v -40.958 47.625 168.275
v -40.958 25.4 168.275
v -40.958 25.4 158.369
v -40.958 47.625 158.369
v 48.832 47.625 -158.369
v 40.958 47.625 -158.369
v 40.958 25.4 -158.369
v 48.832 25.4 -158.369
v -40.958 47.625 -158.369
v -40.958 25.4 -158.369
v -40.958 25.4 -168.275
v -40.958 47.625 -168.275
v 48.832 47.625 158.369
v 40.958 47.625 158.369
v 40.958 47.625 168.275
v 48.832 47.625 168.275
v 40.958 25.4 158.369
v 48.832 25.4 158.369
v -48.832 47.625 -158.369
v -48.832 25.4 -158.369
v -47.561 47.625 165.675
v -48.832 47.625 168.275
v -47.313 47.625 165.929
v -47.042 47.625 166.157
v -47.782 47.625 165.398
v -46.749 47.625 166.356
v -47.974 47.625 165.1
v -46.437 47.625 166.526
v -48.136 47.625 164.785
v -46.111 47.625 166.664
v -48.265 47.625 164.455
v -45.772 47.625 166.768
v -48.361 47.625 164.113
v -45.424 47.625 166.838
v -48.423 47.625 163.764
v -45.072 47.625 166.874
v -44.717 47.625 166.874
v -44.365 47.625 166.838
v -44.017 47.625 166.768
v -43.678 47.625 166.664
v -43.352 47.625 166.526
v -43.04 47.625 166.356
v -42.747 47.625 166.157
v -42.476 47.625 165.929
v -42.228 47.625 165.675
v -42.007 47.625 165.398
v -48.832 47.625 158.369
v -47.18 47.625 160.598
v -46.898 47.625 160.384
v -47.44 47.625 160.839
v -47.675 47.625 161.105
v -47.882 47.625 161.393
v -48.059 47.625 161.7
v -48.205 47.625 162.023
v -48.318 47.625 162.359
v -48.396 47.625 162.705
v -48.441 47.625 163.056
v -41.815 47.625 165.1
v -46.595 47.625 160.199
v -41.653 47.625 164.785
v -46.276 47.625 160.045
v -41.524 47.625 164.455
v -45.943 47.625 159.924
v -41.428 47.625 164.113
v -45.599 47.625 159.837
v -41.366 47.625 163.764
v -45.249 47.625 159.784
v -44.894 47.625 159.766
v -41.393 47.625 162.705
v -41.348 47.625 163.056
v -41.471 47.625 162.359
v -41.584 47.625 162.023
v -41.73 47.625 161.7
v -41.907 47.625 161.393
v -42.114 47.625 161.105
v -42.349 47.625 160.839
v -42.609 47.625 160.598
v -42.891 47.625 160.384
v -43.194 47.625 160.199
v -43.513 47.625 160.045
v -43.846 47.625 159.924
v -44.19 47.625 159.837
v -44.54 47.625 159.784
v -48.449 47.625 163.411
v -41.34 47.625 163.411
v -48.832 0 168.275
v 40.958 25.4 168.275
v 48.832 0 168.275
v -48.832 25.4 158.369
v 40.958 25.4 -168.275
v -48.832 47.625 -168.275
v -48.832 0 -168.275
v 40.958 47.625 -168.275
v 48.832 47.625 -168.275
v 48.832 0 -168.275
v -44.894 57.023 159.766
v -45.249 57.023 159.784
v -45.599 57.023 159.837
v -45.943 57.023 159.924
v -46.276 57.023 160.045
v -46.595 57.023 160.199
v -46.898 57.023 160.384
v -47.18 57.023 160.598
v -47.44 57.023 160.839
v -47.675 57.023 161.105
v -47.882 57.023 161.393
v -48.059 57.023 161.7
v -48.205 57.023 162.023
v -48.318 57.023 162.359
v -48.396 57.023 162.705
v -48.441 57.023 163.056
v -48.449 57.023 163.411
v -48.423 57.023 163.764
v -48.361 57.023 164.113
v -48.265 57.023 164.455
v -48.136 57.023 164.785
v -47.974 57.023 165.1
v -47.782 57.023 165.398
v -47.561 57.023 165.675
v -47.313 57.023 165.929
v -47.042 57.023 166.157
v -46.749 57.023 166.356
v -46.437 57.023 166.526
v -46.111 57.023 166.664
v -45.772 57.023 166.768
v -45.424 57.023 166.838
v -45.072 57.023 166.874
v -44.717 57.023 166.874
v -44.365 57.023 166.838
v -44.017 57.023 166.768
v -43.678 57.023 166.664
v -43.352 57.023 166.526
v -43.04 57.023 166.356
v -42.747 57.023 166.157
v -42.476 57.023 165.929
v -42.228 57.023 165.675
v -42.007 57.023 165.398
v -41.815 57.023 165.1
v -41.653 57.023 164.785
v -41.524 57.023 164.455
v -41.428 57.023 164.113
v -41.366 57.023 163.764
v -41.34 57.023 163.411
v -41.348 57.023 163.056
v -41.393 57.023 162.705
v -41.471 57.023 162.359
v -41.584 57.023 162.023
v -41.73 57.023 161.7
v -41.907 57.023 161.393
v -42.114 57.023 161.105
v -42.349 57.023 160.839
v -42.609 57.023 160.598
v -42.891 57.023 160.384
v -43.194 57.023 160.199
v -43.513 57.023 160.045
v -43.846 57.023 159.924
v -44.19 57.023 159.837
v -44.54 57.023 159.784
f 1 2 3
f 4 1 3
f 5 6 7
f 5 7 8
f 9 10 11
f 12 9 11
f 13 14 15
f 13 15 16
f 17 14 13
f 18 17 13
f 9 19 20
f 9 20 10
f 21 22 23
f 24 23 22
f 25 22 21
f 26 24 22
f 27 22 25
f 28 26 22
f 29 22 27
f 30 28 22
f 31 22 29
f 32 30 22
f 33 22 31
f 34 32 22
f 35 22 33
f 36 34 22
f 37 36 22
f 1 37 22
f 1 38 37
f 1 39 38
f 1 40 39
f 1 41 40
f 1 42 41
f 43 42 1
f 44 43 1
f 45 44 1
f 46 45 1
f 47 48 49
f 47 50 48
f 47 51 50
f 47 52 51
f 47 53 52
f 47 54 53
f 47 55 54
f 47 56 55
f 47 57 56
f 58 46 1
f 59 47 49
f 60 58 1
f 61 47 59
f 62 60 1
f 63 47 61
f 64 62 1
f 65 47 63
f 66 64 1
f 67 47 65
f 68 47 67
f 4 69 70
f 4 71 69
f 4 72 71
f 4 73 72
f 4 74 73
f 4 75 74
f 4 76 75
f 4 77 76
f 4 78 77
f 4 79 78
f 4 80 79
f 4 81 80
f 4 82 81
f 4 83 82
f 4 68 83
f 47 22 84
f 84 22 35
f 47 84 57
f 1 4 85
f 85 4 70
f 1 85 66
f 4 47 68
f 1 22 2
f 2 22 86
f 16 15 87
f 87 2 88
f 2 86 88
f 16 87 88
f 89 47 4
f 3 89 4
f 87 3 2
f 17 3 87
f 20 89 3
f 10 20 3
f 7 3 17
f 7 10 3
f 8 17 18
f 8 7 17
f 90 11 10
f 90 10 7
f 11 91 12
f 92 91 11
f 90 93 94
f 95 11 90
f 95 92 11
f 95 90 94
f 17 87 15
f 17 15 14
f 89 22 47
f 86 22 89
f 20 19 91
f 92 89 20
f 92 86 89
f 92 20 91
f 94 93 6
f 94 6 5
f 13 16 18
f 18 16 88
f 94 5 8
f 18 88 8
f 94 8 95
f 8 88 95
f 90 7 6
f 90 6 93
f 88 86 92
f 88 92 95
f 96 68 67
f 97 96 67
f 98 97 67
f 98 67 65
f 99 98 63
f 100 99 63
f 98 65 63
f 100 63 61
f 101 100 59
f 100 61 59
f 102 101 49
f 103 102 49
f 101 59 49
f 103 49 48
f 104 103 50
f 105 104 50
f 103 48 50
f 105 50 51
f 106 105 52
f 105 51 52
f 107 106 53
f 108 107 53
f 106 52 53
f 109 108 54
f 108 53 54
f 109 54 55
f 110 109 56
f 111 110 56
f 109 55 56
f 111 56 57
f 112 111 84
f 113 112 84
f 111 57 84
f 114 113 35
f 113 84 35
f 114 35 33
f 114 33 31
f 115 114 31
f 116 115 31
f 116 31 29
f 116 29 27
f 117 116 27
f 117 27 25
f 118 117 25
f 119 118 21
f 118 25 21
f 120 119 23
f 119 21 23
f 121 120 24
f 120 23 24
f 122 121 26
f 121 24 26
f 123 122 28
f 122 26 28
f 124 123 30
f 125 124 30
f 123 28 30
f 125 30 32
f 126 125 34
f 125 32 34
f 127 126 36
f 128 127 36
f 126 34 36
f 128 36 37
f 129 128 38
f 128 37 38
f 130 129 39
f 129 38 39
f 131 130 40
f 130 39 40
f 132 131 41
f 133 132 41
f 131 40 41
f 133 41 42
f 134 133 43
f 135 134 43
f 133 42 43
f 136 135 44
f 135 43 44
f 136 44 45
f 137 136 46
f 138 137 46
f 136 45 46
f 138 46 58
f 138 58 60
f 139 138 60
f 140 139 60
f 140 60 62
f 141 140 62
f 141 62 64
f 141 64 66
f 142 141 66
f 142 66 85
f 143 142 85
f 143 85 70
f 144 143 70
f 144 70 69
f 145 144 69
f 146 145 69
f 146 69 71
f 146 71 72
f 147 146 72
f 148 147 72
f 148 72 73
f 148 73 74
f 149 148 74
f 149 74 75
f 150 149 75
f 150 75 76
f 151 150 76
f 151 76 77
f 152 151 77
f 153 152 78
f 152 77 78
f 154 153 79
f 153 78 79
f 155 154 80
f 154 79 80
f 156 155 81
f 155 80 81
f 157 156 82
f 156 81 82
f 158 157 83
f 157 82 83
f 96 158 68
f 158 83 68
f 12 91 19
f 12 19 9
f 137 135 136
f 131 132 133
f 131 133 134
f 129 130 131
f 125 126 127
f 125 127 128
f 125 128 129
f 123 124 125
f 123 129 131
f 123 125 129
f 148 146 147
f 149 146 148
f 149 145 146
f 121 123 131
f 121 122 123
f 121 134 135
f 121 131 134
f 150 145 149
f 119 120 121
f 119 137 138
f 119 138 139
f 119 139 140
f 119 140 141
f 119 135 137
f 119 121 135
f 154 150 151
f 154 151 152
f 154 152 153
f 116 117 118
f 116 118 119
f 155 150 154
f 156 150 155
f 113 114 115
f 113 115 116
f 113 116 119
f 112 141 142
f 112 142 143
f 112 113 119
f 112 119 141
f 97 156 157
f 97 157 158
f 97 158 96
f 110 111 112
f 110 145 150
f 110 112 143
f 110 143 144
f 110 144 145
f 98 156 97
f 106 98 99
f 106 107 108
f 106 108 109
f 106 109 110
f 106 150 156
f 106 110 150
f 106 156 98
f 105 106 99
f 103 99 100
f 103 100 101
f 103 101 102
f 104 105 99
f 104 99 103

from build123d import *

# Parameters (mm, degrees)
SKETCH1_W           = 97.663
SKETCH1_H           = 336.55
BASE_DEPTH          = 25.4
SKETCH2_W           = 7.874
SKETCH2_H           = 9.906
BOSS_EXTRUDE2_DEPTH = 22.225
SKETCH3_R           = 3.556
BOSS_EXTRUDE3_DEPTH = 9.398


with BuildPart() as part:
    # Sketch1 → Base (new body)
    with BuildSketch(Plane(origin=(0, 0, 0), x_dir=(1, 0, 0), z_dir=(0, 1, 0))):
        Rectangle(SKETCH1_W, SKETCH1_H)
    extrude(amount=BASE_DEPTH)

    # Sketch2 → Boss-Extrude2 (add)
    with BuildSketch(Plane(origin=(0, 25.4, 0), x_dir=(1, 0, 0), z_dir=(0, 1, 0))):
        with Locations((-44.8945, -163.322)):
            Rectangle(SKETCH2_W, SKETCH2_H)
        with Locations((44.8945, -163.322)):
            Rectangle(SKETCH2_W, SKETCH2_H)
        with Locations((44.8945, 163.322)):
            Rectangle(SKETCH2_W, SKETCH2_H)
        with Locations((-44.8945, 163.322)):
            Rectangle(SKETCH2_W, SKETCH2_H)
    extrude(amount=BOSS_EXTRUDE2_DEPTH)

    # Sketch3 → Boss-Extrude3 (add)
    with BuildSketch(Plane(origin=(0, 47.625, 0), x_dir=(1, 0, 0), z_dir=(0, 1, 0))):
        with Locations(Location((-44.8945, -163.322, 0), (0, 0, 90))):
            Circle(SKETCH3_R)
    extrude(amount=BOSS_EXTRUDE3_DEPTH)


solid = part.part
